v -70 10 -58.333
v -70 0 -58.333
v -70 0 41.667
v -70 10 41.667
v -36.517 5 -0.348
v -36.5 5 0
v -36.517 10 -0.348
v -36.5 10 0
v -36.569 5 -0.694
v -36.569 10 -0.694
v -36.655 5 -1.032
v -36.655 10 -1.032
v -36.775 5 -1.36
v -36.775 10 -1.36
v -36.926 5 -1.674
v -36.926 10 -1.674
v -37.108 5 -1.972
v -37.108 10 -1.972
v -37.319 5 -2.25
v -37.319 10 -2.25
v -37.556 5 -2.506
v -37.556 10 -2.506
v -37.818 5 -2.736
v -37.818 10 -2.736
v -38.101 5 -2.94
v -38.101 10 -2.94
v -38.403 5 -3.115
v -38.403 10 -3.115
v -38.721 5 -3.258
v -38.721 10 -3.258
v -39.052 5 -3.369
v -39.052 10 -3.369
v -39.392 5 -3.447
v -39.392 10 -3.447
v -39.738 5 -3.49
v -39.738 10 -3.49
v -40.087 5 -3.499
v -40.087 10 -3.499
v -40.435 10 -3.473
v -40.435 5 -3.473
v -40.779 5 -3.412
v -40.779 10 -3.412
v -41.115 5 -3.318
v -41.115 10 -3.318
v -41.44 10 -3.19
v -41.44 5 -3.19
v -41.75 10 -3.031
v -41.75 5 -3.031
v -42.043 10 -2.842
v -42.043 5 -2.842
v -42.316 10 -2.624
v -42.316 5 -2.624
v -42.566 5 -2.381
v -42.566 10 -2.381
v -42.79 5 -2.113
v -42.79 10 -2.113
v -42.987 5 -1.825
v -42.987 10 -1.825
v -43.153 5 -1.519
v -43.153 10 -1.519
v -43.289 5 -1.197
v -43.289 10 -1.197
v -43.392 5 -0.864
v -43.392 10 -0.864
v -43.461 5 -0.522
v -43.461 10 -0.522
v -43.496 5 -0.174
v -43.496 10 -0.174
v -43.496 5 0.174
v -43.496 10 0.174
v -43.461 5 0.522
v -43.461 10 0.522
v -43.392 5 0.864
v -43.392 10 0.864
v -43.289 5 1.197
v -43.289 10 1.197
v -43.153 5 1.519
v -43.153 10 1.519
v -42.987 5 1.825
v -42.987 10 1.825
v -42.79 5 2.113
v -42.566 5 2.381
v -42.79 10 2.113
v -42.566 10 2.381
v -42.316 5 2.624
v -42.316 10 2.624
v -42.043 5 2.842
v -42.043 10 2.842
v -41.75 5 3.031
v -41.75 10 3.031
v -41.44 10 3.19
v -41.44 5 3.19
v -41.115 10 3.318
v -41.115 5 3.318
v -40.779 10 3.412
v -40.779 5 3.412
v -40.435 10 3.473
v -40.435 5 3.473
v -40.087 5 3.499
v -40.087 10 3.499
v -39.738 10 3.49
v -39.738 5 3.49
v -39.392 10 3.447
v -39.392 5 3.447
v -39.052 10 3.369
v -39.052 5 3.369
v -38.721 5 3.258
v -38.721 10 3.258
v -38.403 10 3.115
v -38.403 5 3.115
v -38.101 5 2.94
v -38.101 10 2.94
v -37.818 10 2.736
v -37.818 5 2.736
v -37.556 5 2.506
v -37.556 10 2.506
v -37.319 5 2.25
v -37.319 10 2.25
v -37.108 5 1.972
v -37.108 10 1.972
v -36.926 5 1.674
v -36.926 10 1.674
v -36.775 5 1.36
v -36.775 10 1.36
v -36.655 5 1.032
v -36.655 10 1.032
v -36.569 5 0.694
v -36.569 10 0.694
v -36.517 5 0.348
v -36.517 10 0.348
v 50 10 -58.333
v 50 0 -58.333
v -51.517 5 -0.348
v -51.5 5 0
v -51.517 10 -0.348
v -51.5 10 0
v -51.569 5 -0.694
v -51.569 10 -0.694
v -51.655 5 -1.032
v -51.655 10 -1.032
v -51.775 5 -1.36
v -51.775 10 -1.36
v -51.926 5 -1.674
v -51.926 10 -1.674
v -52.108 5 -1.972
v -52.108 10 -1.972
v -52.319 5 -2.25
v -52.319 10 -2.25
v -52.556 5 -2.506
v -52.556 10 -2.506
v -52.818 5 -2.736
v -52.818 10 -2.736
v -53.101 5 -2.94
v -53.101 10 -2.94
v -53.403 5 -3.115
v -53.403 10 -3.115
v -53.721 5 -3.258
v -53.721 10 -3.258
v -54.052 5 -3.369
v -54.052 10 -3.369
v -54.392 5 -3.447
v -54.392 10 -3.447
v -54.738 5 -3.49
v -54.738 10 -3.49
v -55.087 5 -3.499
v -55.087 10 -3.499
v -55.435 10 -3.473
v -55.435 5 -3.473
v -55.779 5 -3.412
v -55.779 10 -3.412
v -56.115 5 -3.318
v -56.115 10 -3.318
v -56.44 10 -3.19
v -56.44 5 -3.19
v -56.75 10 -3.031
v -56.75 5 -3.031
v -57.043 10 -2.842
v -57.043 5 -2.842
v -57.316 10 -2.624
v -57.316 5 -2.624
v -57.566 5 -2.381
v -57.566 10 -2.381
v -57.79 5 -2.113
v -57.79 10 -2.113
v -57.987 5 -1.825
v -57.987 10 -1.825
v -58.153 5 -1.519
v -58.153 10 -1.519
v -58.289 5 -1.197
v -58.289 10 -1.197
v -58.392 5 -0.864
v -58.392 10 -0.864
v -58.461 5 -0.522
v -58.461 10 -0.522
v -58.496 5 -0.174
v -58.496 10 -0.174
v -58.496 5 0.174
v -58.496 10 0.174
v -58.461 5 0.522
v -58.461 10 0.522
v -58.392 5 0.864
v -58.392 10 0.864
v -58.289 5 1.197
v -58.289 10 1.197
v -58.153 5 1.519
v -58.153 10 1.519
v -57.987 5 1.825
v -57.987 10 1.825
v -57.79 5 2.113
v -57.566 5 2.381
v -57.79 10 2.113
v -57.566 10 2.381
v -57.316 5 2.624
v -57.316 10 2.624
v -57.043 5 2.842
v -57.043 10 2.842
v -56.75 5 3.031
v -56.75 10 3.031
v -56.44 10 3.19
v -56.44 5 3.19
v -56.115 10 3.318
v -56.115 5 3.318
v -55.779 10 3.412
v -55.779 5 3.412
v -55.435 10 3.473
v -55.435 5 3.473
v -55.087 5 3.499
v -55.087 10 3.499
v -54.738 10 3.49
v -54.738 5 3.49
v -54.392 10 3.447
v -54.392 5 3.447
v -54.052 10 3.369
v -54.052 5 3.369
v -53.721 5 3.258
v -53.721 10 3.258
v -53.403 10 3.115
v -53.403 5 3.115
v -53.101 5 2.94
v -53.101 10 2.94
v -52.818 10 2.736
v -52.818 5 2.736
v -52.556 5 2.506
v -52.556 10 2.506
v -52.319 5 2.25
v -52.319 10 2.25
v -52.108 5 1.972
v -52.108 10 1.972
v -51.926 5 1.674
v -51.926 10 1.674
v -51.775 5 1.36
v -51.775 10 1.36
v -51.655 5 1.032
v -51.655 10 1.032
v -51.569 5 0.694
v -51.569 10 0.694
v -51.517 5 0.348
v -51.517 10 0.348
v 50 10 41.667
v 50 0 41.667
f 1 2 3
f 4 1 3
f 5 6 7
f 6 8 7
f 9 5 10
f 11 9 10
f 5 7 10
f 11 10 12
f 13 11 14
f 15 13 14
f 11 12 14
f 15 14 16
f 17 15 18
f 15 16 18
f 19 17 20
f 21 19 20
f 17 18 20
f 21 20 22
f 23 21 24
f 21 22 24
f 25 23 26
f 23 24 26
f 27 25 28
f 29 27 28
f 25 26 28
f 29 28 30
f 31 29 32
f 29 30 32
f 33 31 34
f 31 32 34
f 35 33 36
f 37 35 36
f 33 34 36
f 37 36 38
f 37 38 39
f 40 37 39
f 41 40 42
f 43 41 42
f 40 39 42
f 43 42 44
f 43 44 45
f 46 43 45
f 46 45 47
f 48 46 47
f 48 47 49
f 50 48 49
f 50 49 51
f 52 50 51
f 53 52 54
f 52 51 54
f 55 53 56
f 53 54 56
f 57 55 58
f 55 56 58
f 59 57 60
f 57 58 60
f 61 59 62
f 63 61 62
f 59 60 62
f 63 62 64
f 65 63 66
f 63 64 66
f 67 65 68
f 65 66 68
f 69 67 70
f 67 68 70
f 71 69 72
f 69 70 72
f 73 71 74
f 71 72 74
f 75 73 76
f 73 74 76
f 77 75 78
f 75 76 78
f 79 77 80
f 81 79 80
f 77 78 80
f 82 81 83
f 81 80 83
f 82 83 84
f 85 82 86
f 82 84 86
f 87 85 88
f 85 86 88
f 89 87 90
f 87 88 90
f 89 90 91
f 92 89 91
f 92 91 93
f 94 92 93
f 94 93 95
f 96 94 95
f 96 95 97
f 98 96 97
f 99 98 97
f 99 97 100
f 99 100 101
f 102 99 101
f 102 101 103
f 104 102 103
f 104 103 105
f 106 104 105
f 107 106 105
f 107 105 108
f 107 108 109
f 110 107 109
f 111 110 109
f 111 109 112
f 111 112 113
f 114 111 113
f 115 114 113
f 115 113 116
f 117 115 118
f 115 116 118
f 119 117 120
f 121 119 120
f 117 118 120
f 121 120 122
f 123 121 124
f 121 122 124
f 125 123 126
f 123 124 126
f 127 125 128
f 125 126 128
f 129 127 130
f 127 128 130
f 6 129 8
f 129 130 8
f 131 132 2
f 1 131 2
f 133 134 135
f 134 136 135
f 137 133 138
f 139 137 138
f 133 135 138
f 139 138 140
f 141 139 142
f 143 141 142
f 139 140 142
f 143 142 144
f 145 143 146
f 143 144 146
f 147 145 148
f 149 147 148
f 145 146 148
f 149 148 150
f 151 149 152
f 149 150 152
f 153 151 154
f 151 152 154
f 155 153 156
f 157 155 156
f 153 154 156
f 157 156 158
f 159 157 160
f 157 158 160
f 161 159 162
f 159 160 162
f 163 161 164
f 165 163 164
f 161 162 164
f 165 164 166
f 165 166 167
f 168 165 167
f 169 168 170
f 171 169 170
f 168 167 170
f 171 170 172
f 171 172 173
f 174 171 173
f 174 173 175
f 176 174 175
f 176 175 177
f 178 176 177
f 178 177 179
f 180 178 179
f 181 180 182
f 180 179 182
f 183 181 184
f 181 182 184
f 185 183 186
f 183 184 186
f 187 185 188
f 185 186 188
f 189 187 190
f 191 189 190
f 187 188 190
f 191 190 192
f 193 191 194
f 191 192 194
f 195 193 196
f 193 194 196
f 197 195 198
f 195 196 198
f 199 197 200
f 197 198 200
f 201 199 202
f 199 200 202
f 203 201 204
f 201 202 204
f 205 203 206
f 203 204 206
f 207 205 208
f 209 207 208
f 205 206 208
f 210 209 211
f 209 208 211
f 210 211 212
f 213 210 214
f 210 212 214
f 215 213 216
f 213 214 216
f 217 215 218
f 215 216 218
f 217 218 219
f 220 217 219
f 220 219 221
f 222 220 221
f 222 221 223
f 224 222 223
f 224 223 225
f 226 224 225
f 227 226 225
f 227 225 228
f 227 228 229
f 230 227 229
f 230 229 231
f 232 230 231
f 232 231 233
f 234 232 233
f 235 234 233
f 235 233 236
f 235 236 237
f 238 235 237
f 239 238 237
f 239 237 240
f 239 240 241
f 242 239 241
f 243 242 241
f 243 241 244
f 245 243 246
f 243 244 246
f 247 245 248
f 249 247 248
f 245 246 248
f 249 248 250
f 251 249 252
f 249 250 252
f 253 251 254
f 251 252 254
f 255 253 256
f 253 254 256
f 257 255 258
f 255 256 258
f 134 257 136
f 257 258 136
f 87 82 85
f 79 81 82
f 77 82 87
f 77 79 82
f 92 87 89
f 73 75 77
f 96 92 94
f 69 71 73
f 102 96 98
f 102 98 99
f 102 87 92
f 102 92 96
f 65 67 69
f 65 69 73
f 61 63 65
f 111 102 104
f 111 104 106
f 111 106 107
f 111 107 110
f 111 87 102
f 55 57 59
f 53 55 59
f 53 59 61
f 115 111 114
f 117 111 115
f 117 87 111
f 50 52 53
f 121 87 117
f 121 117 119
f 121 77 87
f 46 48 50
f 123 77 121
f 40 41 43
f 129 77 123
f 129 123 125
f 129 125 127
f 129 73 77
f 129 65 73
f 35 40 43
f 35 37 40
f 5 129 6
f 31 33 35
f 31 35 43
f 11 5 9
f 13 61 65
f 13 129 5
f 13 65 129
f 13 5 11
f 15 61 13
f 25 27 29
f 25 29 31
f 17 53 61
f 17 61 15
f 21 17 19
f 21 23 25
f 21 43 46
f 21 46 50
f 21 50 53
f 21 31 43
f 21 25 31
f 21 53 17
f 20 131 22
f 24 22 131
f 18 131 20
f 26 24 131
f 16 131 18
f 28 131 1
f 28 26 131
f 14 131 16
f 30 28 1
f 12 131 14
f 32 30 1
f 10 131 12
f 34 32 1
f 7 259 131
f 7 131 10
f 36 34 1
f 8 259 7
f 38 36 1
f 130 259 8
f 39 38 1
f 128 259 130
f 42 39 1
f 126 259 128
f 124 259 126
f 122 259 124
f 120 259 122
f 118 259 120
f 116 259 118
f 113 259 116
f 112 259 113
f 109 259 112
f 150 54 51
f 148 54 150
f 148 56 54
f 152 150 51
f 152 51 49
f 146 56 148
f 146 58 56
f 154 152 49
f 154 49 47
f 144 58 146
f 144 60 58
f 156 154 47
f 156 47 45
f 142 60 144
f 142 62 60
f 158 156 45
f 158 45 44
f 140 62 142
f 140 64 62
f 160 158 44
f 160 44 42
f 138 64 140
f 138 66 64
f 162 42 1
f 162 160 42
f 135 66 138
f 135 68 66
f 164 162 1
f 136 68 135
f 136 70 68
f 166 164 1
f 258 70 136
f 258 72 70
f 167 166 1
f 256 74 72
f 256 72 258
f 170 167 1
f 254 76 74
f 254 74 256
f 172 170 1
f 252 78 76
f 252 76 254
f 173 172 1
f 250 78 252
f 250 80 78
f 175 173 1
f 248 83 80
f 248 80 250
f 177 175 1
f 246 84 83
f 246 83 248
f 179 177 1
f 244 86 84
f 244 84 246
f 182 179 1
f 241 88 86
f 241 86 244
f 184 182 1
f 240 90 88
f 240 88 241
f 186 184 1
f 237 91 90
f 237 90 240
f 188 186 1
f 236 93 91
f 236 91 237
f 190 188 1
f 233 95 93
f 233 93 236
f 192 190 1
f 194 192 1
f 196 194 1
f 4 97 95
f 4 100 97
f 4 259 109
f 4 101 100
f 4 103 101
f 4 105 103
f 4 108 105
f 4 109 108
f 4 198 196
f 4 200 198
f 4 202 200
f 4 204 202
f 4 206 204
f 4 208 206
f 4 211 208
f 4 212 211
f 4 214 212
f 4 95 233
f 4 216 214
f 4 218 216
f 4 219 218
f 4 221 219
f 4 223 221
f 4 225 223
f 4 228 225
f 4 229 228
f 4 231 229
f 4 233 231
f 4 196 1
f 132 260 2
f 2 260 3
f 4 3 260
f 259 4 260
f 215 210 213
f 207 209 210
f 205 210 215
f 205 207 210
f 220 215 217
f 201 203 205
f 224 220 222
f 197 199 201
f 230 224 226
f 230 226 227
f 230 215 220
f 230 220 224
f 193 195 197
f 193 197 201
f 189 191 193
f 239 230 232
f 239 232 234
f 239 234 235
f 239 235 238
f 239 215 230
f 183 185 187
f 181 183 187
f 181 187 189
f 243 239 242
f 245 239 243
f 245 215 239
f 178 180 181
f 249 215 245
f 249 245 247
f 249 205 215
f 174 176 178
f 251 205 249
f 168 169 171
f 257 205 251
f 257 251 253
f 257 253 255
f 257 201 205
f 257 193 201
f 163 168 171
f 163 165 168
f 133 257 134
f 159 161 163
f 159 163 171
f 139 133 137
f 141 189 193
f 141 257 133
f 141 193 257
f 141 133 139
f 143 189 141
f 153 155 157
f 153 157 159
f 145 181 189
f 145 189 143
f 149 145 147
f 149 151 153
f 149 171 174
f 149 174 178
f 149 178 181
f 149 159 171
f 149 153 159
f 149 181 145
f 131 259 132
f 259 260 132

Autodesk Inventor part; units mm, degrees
ref_plane "YZ Plane" through (0, 0, 0) normal (1, 0, 0) x (0, 1, 0)
ref_plane "XZ Plane" through (0, 0, 0) normal (0, 1, 0) x (-1, 0, 0)
ref_plane "XY Plane" through (0, 0, 0) normal (0, 0, 1) x (1, 0, 0)
sketch "Sketch1" plane through (0, 0, 0) normal (0, 1, 0) x (-1, 0, 0)
  line L0 (70, 41.6667) -> (-50, 41.6667)
  line L1 (-50, 41.6667) -> (-50, -58.3333)
  line L2 (-50, -58.3333) -> (70, -58.3333)
  line L3 (70, -58.3333) -> (70, 41.6667)
  point P0 (0, 0)
  dimension "d0" = 100
  dimension "d1" = 120
  dimension "d2" = 70
  dimension "d3" = 41.6667
extrude "Extrusion1" add sketch "Sketch1" along normal blind 10
sketch "Sketch2" plane through (0, 10, 0) normal (0, 1, 0) x (1, 0, 0)
  circle A0 centre (-40, 0) radius 3.5
  circle A1 centre (-55, 0) radius 3.5
  line L0 (-70, 58.3333) -> (-70, -41.6667) projected
  point P0 (0, 0)
  dimension "d6" = 7
  dimension "d7" = 7
  dimension "d8" = 30
  dimension "d9" = 15
  dimension "d12" = 15
  dimension "d13" = 40
extrude "Extrusion2" cut sketch "Sketch2" against normal blind 5
thread "Thread1" size "M7x1" class "6H" standard "ANSI Metric M Profile" full length
thread "Thread2" size "M7x1" class "6H" standard "ANSI Metric M Profile" full length
properties part number "Load cell support" material "Stainless Steel"
